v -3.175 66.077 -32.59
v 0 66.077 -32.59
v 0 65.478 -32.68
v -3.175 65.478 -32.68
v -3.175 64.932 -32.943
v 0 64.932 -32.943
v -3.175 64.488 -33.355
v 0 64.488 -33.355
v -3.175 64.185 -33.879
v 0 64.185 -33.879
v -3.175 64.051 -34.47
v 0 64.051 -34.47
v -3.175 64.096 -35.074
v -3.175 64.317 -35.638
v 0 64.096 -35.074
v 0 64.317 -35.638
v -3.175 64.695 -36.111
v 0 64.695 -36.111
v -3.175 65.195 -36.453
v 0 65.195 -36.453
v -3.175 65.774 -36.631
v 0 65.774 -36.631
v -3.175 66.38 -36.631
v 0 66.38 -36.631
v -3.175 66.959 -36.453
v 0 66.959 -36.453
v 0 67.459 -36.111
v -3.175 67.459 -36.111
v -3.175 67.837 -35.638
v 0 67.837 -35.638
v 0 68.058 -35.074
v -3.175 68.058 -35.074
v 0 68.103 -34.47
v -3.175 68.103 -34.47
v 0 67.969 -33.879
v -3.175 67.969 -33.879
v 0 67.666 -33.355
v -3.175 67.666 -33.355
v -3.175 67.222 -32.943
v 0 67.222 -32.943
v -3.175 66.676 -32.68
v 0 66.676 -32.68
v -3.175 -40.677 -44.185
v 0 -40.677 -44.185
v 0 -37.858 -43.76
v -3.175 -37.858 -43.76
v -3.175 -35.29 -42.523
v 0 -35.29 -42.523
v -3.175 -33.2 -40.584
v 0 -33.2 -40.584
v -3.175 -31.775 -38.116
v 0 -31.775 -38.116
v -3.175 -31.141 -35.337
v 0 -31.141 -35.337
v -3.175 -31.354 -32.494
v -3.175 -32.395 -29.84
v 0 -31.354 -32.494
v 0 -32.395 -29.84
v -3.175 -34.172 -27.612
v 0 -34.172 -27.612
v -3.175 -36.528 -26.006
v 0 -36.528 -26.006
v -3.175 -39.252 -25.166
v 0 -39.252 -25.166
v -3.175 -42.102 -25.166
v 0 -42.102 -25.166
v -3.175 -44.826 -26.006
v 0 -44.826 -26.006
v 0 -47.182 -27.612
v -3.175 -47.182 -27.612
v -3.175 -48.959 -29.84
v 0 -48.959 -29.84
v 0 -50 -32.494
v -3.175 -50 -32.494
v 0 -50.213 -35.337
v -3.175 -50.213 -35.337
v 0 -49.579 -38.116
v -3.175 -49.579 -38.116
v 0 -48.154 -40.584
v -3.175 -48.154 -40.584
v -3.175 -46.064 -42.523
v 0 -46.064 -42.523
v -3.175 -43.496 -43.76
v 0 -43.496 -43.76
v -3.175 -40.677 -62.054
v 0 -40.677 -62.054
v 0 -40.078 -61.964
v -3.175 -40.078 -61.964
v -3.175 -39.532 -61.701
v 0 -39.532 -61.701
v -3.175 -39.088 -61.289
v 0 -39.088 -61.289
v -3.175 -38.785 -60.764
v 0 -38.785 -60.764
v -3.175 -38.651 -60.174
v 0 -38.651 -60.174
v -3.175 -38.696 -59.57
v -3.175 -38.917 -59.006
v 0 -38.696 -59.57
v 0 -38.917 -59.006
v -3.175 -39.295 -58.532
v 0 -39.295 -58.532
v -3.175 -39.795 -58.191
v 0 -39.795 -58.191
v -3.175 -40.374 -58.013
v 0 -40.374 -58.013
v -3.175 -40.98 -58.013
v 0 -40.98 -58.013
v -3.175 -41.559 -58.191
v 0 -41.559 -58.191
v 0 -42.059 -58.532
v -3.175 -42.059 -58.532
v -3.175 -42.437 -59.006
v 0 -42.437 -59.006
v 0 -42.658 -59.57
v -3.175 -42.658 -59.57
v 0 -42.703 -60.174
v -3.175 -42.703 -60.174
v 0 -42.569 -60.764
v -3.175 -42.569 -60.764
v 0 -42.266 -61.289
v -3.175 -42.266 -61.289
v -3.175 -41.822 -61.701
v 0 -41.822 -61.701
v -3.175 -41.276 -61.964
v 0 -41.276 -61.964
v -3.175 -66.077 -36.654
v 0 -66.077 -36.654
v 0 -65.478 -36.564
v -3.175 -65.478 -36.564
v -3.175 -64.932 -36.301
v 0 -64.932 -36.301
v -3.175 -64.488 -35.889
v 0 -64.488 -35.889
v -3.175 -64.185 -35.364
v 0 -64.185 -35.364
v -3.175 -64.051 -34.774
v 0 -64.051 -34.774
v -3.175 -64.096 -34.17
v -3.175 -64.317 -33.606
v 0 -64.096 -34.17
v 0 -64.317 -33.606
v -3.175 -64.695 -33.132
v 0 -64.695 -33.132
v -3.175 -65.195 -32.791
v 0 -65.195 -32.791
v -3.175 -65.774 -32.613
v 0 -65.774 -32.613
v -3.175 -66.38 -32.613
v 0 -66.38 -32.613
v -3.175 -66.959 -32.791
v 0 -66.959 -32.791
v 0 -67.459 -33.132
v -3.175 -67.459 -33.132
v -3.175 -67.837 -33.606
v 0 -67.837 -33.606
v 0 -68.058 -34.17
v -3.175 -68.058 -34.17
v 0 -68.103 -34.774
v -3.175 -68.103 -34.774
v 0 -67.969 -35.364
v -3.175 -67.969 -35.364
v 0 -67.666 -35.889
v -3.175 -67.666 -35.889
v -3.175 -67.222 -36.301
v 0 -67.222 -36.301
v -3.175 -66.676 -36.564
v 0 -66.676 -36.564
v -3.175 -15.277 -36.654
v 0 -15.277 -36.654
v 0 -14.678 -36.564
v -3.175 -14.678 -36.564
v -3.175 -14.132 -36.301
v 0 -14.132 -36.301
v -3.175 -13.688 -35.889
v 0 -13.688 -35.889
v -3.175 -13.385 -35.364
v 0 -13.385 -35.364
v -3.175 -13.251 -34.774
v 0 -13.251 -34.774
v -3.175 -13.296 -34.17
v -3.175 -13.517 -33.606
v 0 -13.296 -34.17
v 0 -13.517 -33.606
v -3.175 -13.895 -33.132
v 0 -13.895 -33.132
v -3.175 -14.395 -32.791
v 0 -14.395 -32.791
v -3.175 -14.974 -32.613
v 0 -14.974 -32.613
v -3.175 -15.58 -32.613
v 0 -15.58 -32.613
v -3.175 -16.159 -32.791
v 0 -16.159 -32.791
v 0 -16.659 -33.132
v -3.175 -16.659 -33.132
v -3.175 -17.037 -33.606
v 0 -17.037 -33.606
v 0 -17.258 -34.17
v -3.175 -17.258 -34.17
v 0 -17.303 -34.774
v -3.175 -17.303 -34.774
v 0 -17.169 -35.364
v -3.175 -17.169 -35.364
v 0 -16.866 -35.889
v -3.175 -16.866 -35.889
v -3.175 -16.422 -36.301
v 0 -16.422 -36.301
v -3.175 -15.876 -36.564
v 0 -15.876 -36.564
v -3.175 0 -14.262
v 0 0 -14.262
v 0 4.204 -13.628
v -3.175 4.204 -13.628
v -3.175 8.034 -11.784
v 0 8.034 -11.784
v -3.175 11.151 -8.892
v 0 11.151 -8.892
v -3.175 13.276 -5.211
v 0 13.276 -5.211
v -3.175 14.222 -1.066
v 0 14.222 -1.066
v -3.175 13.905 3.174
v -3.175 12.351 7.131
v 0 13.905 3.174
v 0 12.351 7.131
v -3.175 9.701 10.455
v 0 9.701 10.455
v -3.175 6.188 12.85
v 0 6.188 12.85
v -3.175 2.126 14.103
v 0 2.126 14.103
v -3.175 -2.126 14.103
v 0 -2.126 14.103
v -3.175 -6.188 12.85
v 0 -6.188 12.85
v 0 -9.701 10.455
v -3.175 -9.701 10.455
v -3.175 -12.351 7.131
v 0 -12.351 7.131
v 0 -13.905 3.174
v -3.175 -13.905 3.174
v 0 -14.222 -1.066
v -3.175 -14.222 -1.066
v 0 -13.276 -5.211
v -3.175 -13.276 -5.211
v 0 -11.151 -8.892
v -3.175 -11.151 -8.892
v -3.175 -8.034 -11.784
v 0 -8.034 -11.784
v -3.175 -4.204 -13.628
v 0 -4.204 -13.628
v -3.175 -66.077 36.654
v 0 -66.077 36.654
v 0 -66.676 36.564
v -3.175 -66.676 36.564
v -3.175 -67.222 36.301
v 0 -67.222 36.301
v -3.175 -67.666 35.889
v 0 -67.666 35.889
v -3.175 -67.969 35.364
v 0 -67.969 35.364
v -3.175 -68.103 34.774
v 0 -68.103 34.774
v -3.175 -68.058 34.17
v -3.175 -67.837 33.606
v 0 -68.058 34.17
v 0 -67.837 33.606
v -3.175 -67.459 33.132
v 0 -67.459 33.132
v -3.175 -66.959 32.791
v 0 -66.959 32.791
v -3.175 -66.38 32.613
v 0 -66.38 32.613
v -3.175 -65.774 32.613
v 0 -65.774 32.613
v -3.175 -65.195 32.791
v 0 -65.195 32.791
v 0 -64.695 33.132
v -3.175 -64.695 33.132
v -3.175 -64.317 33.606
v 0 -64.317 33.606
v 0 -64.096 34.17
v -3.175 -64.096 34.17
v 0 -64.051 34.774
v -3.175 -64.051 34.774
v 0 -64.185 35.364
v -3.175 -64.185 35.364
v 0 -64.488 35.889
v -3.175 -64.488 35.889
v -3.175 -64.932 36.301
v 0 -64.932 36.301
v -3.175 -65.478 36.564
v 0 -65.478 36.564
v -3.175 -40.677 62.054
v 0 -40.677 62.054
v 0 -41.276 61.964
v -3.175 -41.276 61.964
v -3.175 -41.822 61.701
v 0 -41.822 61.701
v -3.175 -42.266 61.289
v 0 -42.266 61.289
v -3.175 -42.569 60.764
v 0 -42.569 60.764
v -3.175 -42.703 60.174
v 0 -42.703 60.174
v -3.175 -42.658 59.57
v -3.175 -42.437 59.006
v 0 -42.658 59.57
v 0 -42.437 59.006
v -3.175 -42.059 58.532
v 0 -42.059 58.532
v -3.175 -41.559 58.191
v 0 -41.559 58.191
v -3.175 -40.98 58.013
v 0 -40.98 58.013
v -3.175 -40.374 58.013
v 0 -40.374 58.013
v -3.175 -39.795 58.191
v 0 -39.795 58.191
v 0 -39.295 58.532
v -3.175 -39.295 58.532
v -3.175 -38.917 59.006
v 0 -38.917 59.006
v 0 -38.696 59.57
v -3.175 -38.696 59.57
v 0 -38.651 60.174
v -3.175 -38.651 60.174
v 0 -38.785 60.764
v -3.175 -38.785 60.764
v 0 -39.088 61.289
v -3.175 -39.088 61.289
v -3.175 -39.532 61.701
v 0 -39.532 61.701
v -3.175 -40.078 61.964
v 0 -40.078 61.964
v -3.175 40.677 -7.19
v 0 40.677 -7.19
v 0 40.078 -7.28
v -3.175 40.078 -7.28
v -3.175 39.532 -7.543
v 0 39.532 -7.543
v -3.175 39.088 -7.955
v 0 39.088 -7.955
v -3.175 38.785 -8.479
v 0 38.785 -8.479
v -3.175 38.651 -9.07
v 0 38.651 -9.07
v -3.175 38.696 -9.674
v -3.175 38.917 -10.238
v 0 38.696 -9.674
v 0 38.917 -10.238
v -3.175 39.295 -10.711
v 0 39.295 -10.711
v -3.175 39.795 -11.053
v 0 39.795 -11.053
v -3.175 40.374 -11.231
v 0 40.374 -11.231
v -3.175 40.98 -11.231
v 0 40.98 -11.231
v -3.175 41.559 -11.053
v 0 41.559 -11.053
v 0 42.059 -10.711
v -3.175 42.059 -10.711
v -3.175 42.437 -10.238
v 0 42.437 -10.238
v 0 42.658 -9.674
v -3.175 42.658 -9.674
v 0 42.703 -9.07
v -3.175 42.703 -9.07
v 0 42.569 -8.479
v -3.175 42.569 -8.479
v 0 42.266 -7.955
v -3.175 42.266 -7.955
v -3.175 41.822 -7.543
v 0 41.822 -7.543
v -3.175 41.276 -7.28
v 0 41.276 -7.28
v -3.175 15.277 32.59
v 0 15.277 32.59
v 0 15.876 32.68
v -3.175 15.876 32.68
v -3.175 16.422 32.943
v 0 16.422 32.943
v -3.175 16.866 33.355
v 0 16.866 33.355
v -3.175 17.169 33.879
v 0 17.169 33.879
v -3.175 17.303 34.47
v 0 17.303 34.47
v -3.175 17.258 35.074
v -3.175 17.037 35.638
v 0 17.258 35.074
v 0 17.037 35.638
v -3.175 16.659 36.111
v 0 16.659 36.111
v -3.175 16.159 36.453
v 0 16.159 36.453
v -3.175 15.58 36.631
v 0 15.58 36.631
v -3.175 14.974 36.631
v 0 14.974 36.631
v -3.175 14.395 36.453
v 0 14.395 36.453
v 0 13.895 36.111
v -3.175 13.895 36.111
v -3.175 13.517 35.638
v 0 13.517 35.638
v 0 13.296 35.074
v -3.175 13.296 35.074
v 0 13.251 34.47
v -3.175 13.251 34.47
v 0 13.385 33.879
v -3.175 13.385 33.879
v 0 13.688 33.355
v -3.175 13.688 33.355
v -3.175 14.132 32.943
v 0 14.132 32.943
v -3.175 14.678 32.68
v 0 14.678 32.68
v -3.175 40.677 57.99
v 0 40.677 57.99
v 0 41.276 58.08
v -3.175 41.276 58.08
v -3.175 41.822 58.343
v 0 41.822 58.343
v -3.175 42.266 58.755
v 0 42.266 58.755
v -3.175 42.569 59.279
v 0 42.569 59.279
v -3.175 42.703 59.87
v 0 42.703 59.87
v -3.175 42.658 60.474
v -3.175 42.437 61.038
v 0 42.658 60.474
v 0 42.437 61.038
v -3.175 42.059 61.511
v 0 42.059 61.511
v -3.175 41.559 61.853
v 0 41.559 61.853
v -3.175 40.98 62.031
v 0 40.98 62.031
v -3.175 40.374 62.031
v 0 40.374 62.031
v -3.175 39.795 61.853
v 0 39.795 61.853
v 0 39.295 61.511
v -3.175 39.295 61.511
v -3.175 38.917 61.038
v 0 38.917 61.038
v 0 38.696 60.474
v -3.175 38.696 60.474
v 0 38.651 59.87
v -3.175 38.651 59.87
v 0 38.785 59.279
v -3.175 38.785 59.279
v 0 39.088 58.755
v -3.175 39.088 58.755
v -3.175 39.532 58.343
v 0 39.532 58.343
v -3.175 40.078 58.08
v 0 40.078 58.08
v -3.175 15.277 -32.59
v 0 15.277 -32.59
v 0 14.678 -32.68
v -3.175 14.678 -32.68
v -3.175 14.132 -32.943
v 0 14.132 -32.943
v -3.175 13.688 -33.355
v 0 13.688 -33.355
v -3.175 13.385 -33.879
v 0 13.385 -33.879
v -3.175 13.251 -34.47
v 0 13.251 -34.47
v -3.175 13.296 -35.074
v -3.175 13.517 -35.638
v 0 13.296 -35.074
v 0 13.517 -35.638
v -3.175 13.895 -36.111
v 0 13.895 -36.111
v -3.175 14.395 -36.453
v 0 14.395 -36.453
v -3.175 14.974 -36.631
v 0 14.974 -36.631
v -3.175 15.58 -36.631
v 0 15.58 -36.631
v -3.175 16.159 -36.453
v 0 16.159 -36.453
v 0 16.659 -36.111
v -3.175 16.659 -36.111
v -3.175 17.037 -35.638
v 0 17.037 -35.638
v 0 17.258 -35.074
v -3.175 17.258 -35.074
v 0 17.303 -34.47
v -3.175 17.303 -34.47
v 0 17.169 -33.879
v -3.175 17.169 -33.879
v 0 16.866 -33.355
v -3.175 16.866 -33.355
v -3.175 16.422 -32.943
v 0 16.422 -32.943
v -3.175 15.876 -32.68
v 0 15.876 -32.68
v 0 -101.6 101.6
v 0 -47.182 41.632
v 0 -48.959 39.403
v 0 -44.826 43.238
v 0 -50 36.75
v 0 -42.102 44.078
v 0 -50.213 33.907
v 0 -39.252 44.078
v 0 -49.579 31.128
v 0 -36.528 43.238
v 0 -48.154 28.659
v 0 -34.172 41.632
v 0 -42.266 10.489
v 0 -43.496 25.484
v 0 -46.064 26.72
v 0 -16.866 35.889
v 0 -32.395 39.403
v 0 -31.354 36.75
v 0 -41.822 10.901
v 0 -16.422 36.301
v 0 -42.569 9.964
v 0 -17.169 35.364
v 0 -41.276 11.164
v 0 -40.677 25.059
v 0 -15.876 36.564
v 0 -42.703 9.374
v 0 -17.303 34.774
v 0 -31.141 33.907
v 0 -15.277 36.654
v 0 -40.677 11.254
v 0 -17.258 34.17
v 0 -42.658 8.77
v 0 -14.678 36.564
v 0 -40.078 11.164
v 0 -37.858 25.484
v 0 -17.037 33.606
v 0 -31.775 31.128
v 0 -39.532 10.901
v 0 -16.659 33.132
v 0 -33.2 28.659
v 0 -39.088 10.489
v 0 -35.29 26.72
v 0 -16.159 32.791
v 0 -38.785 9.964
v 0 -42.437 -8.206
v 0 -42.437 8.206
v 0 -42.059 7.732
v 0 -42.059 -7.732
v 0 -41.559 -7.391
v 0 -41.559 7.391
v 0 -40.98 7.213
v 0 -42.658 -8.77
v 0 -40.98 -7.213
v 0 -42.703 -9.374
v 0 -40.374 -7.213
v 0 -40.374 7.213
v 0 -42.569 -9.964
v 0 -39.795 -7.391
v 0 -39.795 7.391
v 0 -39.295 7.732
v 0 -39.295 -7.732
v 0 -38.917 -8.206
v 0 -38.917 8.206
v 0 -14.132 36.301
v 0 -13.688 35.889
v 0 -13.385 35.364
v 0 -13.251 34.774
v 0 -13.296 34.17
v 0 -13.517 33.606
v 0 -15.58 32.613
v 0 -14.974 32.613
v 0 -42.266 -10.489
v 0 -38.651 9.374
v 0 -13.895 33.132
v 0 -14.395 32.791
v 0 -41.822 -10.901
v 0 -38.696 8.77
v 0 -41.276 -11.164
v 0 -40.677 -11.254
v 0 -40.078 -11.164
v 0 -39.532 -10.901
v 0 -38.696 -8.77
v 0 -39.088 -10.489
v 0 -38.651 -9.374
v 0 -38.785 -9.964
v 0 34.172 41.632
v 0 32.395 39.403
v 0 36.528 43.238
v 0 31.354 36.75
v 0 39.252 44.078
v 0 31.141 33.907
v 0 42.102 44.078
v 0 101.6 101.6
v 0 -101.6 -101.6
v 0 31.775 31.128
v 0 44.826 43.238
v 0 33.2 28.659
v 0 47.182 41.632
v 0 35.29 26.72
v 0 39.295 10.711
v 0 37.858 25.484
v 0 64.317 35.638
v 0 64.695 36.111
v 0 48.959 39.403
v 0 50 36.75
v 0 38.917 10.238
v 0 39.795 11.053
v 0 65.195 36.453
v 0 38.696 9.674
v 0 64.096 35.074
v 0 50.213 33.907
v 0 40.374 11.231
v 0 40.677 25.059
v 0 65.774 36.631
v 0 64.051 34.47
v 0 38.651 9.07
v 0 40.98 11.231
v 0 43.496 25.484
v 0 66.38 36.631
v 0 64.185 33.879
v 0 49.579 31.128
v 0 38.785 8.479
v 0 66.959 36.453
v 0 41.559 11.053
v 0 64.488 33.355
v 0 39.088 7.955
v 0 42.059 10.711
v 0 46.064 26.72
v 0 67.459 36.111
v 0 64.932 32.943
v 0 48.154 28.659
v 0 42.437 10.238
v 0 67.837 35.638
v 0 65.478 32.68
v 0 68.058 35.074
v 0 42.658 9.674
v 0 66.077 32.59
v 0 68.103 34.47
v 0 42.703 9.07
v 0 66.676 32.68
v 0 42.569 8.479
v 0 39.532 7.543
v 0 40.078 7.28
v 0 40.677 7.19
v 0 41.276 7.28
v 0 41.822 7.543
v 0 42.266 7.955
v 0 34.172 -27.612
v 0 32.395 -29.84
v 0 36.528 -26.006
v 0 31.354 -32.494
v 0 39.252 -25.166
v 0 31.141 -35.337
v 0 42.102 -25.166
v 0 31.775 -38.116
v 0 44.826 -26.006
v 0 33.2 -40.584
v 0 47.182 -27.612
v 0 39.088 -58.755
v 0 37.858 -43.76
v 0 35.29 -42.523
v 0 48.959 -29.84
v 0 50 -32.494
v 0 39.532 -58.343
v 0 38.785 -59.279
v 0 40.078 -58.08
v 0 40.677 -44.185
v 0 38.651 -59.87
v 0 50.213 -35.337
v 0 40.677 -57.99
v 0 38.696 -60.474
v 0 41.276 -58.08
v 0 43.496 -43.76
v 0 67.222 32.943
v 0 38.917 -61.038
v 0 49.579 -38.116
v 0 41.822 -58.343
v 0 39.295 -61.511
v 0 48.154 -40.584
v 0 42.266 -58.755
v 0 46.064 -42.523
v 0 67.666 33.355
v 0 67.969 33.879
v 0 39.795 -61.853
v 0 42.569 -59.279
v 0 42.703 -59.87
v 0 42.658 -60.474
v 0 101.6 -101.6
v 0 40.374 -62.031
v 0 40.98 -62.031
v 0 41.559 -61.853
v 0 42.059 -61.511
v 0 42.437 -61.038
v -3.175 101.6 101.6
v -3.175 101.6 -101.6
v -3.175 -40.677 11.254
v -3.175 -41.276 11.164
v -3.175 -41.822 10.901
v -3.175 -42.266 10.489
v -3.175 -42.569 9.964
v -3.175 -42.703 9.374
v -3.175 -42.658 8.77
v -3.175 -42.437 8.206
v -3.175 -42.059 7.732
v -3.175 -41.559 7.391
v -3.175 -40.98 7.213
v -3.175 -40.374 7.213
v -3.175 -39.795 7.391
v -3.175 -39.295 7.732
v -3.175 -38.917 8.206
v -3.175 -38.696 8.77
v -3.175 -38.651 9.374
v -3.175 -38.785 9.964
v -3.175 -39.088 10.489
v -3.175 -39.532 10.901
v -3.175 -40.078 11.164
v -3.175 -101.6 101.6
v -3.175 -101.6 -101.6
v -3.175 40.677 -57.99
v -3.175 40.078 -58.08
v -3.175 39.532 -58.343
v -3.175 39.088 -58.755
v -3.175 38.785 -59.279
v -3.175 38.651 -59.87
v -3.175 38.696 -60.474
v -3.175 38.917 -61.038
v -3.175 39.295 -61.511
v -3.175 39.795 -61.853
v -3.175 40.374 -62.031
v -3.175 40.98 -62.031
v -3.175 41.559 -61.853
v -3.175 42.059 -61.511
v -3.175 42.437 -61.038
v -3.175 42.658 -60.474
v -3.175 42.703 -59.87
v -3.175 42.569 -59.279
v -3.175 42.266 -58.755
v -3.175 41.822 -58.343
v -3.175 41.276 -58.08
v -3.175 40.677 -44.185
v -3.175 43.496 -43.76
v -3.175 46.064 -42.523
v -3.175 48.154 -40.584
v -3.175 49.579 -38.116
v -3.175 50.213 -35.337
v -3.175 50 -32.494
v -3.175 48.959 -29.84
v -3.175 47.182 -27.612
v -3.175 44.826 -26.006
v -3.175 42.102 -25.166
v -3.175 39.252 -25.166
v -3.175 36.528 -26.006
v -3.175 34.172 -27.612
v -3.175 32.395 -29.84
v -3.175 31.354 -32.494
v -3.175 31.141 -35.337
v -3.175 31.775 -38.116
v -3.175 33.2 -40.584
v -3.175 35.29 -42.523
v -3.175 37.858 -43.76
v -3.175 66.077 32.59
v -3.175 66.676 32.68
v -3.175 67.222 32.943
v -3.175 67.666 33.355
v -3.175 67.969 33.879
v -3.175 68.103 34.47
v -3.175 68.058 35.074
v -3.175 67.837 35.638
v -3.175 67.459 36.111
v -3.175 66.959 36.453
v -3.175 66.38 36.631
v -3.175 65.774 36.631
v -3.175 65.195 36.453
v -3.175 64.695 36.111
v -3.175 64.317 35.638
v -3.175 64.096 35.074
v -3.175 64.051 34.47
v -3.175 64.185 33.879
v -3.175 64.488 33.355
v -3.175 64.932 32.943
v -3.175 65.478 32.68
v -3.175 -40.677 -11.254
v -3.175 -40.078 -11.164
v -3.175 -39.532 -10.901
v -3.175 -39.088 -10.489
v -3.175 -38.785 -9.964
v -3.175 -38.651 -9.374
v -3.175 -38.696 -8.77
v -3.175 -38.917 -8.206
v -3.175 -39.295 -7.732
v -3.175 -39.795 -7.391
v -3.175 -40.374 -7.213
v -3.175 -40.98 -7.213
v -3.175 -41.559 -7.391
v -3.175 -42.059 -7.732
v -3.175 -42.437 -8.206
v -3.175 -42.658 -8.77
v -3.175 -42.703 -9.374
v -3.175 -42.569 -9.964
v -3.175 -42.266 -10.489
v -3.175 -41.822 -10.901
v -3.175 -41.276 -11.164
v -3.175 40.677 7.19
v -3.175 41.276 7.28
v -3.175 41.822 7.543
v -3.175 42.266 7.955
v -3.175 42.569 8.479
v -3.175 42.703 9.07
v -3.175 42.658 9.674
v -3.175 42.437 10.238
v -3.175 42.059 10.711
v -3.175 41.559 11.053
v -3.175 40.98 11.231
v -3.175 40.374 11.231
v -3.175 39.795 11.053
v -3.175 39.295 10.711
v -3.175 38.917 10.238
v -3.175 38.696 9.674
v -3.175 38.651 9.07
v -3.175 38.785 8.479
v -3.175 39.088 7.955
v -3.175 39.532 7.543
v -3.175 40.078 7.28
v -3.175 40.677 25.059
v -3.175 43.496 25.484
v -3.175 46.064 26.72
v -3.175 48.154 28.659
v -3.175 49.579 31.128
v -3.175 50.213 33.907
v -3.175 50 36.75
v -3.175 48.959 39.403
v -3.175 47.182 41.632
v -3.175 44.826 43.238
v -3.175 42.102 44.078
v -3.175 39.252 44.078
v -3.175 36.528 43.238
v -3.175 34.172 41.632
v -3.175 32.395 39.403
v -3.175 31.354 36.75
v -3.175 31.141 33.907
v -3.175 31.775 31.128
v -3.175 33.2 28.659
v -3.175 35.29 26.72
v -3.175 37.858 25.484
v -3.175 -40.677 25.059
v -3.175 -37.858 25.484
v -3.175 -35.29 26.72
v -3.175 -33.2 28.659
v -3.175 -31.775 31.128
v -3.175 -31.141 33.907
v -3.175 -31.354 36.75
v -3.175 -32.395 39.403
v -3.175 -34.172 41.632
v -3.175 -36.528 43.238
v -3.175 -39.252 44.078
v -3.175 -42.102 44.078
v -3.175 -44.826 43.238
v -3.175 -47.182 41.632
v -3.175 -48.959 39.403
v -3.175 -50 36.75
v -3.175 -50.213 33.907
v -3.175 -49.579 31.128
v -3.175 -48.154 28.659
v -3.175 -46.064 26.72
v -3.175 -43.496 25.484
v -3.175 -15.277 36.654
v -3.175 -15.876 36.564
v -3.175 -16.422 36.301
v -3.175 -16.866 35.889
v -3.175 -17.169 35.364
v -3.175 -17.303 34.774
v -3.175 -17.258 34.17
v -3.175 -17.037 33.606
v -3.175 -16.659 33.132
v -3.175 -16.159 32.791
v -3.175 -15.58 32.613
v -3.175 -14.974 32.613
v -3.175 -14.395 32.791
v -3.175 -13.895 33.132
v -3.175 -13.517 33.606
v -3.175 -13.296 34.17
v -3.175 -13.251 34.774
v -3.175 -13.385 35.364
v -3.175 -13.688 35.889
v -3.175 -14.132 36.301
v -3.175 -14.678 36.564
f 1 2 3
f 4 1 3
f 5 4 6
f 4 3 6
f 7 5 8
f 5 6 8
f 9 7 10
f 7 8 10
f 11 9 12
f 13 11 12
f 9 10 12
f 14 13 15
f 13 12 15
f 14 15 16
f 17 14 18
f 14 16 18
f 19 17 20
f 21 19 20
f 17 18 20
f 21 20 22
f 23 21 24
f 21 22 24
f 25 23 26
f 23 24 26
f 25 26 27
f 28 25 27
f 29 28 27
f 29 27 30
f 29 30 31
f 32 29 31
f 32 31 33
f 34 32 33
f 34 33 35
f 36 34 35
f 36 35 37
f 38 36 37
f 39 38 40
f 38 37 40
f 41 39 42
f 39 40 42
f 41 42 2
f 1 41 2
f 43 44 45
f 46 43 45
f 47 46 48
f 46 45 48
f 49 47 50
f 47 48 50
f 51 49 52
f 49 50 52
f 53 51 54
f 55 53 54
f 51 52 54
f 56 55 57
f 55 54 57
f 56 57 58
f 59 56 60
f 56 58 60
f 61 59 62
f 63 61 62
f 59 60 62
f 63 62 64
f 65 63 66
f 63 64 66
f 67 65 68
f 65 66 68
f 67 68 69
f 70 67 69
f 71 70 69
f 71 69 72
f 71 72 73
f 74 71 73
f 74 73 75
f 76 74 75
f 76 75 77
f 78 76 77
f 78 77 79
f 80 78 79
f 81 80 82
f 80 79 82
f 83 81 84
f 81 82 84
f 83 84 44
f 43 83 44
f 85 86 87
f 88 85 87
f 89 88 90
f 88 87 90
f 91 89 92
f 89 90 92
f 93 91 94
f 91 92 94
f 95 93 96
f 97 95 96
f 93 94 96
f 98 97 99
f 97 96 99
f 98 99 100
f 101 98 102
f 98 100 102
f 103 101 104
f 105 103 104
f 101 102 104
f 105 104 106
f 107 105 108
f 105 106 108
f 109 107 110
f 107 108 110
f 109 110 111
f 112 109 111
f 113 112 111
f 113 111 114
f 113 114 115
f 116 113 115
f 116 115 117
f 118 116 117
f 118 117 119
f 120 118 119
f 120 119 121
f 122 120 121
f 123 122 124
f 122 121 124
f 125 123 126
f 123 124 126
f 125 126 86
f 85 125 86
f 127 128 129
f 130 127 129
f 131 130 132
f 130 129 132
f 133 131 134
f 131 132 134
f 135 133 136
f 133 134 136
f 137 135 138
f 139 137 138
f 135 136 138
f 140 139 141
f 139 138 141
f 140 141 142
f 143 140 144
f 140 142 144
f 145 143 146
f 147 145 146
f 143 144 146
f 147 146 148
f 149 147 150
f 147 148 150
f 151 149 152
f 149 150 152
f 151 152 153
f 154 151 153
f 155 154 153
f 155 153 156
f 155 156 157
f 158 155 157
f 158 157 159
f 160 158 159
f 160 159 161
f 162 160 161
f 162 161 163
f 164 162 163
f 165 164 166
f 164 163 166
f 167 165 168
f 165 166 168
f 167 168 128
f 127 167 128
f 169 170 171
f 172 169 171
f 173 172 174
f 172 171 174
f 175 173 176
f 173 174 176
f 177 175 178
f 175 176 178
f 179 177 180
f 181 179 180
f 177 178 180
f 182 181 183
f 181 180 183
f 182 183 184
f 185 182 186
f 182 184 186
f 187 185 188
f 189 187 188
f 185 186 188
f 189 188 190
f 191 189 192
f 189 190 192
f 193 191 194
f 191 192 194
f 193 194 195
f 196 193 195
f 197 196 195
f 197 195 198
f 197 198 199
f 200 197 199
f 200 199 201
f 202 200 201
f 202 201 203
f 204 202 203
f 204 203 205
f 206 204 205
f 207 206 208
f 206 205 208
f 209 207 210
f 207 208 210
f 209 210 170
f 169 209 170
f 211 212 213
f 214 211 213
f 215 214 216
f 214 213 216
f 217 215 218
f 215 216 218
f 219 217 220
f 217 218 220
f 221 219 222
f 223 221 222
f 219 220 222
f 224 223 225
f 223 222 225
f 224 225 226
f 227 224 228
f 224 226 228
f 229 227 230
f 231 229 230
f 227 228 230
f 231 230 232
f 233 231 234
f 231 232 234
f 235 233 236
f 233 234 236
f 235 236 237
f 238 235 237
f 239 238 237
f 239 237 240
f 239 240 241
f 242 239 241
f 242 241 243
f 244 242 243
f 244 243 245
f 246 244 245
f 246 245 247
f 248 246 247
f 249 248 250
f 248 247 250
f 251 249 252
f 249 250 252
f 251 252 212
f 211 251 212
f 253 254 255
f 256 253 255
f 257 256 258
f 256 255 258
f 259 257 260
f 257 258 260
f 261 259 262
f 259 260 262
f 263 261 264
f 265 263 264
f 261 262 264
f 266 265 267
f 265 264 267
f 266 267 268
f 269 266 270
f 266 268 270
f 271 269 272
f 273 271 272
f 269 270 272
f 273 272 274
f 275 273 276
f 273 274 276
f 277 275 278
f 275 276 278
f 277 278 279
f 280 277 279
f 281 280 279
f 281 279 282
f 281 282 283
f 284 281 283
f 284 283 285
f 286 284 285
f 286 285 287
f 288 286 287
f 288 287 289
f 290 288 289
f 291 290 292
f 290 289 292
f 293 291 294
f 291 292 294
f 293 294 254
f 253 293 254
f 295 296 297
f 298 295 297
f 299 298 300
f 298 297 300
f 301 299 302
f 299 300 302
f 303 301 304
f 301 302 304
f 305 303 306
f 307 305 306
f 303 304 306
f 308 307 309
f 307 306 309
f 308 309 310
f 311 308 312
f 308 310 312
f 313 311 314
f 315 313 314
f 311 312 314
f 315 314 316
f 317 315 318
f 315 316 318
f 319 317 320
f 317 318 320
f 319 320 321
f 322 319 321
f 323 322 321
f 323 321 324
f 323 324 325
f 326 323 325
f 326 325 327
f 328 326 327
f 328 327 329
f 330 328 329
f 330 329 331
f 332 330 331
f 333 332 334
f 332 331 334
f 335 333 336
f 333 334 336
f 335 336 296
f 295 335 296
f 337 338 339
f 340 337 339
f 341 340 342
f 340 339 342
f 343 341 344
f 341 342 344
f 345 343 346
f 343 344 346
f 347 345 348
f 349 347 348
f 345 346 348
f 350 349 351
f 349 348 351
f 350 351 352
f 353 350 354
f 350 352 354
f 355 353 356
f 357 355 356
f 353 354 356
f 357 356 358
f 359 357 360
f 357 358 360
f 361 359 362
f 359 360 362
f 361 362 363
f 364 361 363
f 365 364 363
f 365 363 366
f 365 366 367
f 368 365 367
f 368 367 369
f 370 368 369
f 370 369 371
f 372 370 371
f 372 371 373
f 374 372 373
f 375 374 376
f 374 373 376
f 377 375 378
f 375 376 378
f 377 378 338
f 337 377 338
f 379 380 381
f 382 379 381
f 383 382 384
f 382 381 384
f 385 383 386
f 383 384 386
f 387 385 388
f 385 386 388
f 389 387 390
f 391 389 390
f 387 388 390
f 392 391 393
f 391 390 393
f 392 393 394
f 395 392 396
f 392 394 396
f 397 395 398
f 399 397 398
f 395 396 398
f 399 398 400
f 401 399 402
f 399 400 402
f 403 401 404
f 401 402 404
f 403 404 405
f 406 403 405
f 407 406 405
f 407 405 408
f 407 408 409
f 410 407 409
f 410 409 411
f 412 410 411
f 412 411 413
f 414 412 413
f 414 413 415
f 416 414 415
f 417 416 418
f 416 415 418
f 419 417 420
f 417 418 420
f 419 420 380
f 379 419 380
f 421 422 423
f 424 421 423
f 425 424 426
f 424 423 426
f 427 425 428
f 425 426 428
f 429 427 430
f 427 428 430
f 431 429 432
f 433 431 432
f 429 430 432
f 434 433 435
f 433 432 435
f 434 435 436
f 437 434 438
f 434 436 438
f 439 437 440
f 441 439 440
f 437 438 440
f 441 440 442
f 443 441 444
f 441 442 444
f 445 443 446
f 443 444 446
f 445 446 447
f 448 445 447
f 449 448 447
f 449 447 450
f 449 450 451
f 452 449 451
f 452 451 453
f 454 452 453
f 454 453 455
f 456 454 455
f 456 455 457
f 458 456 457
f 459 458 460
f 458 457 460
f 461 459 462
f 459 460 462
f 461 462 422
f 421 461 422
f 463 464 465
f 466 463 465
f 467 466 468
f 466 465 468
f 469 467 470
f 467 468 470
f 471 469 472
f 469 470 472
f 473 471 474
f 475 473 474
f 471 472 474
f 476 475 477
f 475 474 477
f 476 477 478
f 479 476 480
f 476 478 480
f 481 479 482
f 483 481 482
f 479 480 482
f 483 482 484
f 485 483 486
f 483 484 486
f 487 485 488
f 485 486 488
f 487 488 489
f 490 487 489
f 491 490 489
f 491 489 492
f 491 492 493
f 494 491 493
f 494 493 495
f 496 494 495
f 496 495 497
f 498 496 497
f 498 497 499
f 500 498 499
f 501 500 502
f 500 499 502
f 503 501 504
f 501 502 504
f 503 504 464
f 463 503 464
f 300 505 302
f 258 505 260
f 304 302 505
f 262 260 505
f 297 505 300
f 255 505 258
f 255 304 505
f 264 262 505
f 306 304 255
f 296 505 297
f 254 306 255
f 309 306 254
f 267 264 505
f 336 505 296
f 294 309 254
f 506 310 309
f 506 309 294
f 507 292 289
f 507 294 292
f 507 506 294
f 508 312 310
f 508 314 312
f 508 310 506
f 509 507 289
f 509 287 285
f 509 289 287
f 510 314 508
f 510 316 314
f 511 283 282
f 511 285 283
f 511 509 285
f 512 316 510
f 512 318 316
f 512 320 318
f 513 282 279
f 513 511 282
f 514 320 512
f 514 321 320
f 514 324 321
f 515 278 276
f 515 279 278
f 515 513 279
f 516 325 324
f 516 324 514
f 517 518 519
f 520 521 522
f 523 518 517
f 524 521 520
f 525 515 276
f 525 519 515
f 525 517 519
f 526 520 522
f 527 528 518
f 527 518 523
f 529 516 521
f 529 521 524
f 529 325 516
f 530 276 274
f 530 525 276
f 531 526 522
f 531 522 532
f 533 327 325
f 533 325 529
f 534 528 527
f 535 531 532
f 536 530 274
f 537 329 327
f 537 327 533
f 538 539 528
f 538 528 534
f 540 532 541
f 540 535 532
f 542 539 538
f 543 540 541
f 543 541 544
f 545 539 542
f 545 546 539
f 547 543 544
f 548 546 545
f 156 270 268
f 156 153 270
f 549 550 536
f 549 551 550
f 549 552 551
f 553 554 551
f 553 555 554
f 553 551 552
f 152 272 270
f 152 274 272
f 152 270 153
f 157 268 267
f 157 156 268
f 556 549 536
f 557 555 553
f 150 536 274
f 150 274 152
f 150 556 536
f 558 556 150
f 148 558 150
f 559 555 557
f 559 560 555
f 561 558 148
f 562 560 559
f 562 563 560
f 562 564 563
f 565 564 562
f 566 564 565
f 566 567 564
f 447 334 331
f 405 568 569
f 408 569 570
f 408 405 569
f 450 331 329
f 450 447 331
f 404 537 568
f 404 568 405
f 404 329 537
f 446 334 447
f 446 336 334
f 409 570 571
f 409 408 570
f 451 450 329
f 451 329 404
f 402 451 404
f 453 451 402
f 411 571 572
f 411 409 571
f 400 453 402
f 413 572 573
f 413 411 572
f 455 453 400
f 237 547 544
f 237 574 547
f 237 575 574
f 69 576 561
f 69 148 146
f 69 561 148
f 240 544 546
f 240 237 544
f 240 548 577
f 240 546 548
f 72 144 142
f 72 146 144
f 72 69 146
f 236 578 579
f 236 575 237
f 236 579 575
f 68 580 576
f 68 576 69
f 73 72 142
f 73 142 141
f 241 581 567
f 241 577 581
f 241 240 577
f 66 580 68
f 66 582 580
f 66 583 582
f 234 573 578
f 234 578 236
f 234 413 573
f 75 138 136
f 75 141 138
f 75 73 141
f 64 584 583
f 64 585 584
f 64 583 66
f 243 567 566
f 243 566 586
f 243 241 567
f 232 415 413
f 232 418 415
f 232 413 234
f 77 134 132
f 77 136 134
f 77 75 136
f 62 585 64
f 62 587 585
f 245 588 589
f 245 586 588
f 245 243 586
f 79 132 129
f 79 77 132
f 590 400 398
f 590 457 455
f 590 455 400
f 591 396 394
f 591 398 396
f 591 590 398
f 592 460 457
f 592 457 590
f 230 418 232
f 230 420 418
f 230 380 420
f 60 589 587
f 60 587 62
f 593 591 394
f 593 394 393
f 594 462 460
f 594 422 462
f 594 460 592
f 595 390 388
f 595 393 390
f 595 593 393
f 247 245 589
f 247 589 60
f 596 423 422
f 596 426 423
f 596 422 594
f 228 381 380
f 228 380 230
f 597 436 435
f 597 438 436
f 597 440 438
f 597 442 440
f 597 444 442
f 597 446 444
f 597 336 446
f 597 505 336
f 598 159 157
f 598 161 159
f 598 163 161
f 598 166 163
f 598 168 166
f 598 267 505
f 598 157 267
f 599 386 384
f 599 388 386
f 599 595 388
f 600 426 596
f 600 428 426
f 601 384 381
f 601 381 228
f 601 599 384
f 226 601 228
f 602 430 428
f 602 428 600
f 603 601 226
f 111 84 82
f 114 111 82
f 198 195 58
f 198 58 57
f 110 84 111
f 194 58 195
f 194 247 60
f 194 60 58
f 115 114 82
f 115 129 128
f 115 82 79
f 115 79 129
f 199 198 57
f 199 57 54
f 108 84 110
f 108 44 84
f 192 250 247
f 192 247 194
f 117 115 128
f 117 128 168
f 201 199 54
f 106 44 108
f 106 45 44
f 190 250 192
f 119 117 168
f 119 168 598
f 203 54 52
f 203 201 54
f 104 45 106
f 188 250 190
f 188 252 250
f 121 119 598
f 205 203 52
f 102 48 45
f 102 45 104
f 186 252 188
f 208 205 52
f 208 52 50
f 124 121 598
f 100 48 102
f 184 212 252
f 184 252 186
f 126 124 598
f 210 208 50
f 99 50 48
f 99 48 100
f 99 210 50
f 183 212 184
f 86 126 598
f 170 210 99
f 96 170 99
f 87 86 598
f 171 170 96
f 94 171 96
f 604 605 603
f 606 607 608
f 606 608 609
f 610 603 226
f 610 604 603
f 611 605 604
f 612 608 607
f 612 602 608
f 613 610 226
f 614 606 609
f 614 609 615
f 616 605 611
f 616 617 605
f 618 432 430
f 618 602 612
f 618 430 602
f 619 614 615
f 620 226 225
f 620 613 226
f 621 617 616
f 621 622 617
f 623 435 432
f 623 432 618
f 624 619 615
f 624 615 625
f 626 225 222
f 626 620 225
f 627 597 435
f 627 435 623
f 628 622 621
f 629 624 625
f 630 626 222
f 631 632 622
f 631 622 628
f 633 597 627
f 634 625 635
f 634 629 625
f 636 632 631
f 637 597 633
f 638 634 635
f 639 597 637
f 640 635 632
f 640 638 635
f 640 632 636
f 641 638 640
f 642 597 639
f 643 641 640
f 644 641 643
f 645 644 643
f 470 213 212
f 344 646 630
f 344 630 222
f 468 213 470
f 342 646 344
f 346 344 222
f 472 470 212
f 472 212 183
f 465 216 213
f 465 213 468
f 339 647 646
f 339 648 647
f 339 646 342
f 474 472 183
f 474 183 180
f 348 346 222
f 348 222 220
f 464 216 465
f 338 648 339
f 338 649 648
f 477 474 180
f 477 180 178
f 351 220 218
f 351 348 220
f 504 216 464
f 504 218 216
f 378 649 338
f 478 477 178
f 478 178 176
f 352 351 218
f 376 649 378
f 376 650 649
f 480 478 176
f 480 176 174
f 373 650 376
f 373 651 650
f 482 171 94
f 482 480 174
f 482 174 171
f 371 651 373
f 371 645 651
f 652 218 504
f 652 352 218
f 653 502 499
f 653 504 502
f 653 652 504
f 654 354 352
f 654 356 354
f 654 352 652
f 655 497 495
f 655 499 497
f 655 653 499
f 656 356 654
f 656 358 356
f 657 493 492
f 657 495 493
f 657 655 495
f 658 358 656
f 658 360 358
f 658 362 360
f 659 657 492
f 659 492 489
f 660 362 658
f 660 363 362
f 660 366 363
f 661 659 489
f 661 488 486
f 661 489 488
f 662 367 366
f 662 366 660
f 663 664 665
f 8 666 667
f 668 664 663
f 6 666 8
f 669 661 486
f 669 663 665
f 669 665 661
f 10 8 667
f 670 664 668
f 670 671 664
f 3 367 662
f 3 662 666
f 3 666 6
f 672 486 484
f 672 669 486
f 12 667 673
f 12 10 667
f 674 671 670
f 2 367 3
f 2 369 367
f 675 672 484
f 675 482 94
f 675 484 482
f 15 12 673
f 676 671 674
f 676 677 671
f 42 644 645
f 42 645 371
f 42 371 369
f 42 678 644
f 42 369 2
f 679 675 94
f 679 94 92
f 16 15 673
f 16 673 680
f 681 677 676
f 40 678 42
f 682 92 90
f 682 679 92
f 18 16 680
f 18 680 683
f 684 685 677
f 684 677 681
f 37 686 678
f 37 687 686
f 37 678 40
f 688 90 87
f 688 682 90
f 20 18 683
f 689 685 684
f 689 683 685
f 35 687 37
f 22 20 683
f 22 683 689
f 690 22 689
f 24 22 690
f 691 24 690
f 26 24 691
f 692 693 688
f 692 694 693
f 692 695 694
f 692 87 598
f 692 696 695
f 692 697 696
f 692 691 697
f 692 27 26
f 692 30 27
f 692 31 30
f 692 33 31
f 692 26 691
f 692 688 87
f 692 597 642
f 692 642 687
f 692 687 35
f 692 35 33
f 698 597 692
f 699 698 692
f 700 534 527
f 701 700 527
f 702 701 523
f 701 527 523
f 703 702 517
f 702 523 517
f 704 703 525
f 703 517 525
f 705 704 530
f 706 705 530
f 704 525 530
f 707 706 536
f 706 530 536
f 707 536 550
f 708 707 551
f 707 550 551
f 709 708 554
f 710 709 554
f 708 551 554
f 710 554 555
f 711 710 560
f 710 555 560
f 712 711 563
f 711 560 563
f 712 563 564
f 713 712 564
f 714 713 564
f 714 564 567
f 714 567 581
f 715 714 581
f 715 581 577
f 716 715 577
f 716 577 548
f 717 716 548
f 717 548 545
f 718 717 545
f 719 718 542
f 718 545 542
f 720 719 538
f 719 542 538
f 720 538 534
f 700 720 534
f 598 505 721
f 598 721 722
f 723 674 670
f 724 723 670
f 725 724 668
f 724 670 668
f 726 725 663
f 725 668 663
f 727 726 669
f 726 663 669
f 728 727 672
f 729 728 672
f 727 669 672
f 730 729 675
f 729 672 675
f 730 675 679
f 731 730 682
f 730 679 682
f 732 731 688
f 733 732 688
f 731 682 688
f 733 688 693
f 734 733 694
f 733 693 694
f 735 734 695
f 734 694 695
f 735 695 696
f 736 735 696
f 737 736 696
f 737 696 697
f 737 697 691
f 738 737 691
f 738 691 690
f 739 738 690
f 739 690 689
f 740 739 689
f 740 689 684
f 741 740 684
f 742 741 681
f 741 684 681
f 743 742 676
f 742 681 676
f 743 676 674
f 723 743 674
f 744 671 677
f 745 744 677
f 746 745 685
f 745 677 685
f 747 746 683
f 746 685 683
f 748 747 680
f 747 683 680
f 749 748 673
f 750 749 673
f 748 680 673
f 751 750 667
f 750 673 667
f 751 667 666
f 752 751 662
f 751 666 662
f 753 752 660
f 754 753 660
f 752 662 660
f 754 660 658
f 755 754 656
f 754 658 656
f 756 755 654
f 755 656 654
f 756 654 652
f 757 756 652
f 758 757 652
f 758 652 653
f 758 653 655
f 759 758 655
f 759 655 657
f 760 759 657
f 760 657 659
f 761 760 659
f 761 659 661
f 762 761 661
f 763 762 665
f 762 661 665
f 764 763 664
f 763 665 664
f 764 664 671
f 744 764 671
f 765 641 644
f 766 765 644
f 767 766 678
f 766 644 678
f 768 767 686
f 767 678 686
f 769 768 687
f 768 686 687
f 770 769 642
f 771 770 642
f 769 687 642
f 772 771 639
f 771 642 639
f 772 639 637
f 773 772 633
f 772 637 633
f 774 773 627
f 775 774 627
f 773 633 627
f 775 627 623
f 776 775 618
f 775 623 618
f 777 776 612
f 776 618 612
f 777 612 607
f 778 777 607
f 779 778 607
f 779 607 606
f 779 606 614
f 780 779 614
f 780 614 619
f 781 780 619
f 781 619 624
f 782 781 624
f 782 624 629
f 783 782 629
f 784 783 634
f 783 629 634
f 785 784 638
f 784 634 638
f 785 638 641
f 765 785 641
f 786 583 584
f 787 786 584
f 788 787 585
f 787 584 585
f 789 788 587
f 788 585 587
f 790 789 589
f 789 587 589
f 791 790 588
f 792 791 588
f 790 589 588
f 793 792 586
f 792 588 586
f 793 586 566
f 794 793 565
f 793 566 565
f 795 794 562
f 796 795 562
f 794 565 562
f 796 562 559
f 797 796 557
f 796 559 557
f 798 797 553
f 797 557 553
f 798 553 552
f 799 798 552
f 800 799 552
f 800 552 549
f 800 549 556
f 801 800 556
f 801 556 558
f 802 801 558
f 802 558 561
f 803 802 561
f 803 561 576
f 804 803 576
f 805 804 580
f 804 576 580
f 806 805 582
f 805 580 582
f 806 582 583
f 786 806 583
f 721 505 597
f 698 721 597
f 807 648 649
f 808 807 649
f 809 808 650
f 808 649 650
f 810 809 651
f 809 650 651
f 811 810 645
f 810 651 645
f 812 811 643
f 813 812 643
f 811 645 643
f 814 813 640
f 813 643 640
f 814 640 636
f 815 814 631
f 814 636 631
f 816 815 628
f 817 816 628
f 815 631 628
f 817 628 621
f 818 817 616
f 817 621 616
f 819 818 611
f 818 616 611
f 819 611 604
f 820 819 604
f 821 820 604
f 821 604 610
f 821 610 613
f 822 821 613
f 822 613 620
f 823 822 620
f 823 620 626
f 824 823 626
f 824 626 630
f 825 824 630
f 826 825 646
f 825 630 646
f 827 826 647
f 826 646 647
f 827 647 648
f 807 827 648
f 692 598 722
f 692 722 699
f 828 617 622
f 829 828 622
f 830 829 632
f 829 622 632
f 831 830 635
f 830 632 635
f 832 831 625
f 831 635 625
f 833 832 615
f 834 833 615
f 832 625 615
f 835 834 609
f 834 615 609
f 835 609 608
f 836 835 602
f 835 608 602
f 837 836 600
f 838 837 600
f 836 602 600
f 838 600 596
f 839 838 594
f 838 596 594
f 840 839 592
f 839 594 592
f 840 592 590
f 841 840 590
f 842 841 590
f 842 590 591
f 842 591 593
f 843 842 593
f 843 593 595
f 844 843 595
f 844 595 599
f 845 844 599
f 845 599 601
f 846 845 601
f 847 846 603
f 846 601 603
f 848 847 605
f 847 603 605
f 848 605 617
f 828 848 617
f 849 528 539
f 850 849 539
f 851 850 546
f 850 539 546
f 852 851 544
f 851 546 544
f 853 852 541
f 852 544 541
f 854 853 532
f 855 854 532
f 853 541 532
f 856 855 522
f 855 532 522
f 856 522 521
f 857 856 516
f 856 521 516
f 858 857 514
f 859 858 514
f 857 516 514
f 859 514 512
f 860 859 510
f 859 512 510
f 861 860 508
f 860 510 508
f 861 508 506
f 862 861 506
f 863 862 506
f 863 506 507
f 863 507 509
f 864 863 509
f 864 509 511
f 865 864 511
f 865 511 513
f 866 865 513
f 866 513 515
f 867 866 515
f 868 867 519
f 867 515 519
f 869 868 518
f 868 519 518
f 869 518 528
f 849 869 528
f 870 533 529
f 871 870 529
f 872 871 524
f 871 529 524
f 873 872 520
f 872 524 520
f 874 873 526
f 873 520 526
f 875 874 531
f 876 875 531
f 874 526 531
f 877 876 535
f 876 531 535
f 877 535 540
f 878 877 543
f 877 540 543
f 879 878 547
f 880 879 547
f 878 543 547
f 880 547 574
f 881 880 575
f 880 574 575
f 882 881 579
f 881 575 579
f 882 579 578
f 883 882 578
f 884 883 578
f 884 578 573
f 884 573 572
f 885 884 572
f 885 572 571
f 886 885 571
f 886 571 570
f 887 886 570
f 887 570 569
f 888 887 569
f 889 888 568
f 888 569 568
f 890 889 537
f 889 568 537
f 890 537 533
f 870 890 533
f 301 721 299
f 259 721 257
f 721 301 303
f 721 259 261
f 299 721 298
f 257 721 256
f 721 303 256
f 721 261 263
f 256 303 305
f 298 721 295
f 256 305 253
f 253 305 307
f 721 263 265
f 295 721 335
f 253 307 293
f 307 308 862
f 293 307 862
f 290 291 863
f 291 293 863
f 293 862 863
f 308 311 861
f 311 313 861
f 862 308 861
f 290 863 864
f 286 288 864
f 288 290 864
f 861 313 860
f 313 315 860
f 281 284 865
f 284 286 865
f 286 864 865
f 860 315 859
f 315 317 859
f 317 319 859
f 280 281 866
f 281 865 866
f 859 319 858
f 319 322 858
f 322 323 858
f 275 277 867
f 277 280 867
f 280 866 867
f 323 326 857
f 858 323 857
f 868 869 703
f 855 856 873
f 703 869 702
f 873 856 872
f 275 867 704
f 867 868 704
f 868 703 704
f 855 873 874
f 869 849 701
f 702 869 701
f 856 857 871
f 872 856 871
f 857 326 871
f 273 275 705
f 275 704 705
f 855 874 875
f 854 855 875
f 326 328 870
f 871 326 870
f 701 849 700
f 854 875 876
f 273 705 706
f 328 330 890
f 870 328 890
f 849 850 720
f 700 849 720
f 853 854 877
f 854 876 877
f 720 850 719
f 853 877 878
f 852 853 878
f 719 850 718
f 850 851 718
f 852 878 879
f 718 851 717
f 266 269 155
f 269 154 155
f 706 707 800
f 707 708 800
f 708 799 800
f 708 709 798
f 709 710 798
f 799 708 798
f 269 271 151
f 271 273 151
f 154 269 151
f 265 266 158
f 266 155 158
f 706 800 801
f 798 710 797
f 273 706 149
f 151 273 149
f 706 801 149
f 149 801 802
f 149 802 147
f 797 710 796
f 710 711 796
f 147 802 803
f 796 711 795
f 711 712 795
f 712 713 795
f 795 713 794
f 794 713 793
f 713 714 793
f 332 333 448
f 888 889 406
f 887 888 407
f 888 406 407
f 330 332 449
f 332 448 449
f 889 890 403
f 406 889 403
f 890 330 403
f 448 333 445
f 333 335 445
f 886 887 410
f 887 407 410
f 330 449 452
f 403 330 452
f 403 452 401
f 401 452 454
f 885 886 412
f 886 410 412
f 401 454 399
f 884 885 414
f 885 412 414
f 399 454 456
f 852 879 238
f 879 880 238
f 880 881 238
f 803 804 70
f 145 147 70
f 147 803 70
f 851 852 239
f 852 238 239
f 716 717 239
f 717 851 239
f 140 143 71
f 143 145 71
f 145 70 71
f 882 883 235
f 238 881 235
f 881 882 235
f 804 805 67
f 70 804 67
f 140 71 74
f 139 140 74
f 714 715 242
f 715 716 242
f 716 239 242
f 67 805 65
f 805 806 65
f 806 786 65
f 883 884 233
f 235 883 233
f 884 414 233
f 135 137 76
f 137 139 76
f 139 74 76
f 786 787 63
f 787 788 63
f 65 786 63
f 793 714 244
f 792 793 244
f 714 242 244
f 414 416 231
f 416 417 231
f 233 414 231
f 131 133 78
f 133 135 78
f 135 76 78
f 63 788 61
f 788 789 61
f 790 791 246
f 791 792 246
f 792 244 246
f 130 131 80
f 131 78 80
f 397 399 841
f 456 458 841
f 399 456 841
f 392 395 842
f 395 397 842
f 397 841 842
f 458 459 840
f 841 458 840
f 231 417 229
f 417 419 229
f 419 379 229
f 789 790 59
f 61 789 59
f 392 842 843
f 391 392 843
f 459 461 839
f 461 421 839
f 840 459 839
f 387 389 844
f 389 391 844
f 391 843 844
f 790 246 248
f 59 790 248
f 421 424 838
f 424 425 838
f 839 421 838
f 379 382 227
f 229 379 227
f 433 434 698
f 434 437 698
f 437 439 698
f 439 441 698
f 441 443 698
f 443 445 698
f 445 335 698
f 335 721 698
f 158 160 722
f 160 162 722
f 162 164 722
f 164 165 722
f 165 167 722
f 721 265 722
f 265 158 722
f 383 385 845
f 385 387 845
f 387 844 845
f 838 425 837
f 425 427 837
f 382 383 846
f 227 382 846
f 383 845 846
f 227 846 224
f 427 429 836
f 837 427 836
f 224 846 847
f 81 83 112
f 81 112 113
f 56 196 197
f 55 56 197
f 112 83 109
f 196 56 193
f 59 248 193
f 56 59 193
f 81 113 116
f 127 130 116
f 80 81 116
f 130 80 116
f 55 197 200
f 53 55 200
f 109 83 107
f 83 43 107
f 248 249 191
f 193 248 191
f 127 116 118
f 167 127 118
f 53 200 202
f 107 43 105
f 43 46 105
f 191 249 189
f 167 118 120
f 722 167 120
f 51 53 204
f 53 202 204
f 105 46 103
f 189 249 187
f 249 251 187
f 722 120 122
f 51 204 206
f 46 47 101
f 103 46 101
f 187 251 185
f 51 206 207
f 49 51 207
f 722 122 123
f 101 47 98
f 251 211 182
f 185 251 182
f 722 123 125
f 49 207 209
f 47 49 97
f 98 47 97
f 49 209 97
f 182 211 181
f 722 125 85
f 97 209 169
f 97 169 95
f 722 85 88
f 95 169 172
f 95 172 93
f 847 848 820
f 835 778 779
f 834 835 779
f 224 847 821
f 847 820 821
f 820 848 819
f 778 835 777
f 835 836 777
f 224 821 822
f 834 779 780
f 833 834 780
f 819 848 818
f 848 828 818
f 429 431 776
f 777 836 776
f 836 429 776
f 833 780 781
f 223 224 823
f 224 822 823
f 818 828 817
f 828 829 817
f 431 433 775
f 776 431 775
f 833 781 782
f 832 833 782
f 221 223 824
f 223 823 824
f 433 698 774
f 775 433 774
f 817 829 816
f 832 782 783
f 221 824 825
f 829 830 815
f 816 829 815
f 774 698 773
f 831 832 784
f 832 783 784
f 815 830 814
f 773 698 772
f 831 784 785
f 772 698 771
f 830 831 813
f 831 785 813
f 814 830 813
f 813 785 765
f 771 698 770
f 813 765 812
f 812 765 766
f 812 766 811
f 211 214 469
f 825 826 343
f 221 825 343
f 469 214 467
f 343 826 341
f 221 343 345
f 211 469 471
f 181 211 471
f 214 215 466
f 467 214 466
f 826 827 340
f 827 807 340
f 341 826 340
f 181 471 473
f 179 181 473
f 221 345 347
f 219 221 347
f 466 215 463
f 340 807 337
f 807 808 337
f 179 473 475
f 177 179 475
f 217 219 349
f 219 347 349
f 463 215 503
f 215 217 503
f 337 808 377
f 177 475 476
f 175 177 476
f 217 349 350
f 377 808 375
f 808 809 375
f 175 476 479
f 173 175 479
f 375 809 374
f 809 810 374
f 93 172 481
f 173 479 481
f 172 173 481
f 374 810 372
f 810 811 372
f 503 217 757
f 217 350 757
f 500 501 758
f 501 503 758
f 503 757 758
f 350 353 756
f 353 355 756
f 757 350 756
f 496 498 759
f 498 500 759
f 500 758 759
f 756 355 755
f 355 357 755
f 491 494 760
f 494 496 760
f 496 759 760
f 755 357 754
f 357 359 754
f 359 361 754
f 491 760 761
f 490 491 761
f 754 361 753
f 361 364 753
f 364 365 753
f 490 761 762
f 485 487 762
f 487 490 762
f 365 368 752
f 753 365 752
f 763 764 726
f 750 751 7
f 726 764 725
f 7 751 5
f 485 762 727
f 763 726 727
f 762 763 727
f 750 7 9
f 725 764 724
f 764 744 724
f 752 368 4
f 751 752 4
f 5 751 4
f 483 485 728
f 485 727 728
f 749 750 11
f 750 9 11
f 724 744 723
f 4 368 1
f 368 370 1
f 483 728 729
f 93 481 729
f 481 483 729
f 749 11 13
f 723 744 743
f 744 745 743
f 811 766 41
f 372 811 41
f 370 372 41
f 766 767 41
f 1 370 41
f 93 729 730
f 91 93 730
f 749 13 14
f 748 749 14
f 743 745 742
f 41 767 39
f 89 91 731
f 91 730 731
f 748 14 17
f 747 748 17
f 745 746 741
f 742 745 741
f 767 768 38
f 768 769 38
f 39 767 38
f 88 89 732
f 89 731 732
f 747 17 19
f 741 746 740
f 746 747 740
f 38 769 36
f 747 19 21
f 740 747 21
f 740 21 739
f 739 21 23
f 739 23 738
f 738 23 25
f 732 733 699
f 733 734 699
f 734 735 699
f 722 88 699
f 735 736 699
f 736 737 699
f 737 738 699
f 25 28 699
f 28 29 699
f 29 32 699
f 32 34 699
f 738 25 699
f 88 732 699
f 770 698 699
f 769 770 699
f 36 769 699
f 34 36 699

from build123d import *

# Parameters (mm, degrees)
SKETCH1_W          = 203.2
SKETCH1_H          = 203.2
BASE_FLANGE1_DEPTH = 3.175
SKETCH6_R          = 9.5631
SKETCH6_R_2        = 14.2621
SKETCH6_R_3        = 2.032
CUT_EXTRUDE1_DEPTH = 3.175


# Sheet-metal steps are written as plain solids
with BuildPart() as part:
    # Sketch1 → Base-Flange1 (new body)
    with BuildSketch(Plane(origin=(0, 0, 0), x_dir=(0, 0, -1), z_dir=(1, 0, 0))):
        Rectangle(SKETCH1_W, SKETCH1_H)
    extrude(amount=-BASE_FLANGE1_DEPTH)

    # Sketch6 → Cut-Extrude1 (cut)
    with BuildSketch(Plane(origin=(0, 0, 0), x_dir=(0, 0, -1), z_dir=(1, 0, 0))):
        with Locations((-34.6218707, 40.676977416)):
            Circle(SKETCH6_R)
        with Locations((34.6218707, 40.676977416)):
            Circle(SKETCH6_R)
        with Locations((-34.6218707, -40.676977416)):
            Circle(SKETCH6_R)
        with Locations((34.6218707, -40.676977416)):
            Circle(SKETCH6_R)
        Circle(SKETCH6_R_2)
        with Locations((-34.6218707, 66.076977416)):
            Circle(SKETCH6_R_3)
        with Locations((-34.6218707, 15.276977416)):
            Circle(SKETCH6_R_3)
        with Locations((-60.0218707, 40.676977416)):
            Circle(SKETCH6_R_3)
        with Locations((-9.2218707, 40.676977416)):
            Circle(SKETCH6_R_3)
        with Locations(Location((34.6218707, 15.276977416, 0), (0, 0, 180))):
            Circle(SKETCH6_R_3)
        with Locations(Location((60.0218707, 40.676977416, 0), (0, 0, 180))):
            Circle(SKETCH6_R_3)
        with Locations(Location((9.2218707, 40.676977416, 0), (0, 0, 180))):
            Circle(SKETCH6_R_3)
        with Locations(Location((34.6218707, 66.076977416, 0), (0, 0, 180))):
            Circle(SKETCH6_R_3)
        with Locations((34.6218707, -15.276977416)):
            Circle(SKETCH6_R_3)
        with Locations((60.0218707, -40.676977416)):
            Circle(SKETCH6_R_3)
        with Locations((34.6218707, -66.076977416)):
            Circle(SKETCH6_R_3)
        with Locations((9.2218707, -40.676977416)):
            Circle(SKETCH6_R_3)
        with Locations(Location((-9.2218707, -40.676977416, 0), (0, 0, 180))):
            Circle(SKETCH6_R_3)
        with Locations(Location((-34.6218707, -15.276977416, 0), (0, 0, 180))):
            Circle(SKETCH6_R_3)
        with Locations(Location((-60.0218707, -40.676977416, 0), (0, 0, 180))):
            Circle(SKETCH6_R_3)
        with Locations(Location((-34.6218707, -66.076977416, 0), (0, 0, 180))):
            Circle(SKETCH6_R_3)
    extrude(amount=-CUT_EXTRUDE1_DEPTH, mode=Mode.SUBTRACT)


solid = part.part
